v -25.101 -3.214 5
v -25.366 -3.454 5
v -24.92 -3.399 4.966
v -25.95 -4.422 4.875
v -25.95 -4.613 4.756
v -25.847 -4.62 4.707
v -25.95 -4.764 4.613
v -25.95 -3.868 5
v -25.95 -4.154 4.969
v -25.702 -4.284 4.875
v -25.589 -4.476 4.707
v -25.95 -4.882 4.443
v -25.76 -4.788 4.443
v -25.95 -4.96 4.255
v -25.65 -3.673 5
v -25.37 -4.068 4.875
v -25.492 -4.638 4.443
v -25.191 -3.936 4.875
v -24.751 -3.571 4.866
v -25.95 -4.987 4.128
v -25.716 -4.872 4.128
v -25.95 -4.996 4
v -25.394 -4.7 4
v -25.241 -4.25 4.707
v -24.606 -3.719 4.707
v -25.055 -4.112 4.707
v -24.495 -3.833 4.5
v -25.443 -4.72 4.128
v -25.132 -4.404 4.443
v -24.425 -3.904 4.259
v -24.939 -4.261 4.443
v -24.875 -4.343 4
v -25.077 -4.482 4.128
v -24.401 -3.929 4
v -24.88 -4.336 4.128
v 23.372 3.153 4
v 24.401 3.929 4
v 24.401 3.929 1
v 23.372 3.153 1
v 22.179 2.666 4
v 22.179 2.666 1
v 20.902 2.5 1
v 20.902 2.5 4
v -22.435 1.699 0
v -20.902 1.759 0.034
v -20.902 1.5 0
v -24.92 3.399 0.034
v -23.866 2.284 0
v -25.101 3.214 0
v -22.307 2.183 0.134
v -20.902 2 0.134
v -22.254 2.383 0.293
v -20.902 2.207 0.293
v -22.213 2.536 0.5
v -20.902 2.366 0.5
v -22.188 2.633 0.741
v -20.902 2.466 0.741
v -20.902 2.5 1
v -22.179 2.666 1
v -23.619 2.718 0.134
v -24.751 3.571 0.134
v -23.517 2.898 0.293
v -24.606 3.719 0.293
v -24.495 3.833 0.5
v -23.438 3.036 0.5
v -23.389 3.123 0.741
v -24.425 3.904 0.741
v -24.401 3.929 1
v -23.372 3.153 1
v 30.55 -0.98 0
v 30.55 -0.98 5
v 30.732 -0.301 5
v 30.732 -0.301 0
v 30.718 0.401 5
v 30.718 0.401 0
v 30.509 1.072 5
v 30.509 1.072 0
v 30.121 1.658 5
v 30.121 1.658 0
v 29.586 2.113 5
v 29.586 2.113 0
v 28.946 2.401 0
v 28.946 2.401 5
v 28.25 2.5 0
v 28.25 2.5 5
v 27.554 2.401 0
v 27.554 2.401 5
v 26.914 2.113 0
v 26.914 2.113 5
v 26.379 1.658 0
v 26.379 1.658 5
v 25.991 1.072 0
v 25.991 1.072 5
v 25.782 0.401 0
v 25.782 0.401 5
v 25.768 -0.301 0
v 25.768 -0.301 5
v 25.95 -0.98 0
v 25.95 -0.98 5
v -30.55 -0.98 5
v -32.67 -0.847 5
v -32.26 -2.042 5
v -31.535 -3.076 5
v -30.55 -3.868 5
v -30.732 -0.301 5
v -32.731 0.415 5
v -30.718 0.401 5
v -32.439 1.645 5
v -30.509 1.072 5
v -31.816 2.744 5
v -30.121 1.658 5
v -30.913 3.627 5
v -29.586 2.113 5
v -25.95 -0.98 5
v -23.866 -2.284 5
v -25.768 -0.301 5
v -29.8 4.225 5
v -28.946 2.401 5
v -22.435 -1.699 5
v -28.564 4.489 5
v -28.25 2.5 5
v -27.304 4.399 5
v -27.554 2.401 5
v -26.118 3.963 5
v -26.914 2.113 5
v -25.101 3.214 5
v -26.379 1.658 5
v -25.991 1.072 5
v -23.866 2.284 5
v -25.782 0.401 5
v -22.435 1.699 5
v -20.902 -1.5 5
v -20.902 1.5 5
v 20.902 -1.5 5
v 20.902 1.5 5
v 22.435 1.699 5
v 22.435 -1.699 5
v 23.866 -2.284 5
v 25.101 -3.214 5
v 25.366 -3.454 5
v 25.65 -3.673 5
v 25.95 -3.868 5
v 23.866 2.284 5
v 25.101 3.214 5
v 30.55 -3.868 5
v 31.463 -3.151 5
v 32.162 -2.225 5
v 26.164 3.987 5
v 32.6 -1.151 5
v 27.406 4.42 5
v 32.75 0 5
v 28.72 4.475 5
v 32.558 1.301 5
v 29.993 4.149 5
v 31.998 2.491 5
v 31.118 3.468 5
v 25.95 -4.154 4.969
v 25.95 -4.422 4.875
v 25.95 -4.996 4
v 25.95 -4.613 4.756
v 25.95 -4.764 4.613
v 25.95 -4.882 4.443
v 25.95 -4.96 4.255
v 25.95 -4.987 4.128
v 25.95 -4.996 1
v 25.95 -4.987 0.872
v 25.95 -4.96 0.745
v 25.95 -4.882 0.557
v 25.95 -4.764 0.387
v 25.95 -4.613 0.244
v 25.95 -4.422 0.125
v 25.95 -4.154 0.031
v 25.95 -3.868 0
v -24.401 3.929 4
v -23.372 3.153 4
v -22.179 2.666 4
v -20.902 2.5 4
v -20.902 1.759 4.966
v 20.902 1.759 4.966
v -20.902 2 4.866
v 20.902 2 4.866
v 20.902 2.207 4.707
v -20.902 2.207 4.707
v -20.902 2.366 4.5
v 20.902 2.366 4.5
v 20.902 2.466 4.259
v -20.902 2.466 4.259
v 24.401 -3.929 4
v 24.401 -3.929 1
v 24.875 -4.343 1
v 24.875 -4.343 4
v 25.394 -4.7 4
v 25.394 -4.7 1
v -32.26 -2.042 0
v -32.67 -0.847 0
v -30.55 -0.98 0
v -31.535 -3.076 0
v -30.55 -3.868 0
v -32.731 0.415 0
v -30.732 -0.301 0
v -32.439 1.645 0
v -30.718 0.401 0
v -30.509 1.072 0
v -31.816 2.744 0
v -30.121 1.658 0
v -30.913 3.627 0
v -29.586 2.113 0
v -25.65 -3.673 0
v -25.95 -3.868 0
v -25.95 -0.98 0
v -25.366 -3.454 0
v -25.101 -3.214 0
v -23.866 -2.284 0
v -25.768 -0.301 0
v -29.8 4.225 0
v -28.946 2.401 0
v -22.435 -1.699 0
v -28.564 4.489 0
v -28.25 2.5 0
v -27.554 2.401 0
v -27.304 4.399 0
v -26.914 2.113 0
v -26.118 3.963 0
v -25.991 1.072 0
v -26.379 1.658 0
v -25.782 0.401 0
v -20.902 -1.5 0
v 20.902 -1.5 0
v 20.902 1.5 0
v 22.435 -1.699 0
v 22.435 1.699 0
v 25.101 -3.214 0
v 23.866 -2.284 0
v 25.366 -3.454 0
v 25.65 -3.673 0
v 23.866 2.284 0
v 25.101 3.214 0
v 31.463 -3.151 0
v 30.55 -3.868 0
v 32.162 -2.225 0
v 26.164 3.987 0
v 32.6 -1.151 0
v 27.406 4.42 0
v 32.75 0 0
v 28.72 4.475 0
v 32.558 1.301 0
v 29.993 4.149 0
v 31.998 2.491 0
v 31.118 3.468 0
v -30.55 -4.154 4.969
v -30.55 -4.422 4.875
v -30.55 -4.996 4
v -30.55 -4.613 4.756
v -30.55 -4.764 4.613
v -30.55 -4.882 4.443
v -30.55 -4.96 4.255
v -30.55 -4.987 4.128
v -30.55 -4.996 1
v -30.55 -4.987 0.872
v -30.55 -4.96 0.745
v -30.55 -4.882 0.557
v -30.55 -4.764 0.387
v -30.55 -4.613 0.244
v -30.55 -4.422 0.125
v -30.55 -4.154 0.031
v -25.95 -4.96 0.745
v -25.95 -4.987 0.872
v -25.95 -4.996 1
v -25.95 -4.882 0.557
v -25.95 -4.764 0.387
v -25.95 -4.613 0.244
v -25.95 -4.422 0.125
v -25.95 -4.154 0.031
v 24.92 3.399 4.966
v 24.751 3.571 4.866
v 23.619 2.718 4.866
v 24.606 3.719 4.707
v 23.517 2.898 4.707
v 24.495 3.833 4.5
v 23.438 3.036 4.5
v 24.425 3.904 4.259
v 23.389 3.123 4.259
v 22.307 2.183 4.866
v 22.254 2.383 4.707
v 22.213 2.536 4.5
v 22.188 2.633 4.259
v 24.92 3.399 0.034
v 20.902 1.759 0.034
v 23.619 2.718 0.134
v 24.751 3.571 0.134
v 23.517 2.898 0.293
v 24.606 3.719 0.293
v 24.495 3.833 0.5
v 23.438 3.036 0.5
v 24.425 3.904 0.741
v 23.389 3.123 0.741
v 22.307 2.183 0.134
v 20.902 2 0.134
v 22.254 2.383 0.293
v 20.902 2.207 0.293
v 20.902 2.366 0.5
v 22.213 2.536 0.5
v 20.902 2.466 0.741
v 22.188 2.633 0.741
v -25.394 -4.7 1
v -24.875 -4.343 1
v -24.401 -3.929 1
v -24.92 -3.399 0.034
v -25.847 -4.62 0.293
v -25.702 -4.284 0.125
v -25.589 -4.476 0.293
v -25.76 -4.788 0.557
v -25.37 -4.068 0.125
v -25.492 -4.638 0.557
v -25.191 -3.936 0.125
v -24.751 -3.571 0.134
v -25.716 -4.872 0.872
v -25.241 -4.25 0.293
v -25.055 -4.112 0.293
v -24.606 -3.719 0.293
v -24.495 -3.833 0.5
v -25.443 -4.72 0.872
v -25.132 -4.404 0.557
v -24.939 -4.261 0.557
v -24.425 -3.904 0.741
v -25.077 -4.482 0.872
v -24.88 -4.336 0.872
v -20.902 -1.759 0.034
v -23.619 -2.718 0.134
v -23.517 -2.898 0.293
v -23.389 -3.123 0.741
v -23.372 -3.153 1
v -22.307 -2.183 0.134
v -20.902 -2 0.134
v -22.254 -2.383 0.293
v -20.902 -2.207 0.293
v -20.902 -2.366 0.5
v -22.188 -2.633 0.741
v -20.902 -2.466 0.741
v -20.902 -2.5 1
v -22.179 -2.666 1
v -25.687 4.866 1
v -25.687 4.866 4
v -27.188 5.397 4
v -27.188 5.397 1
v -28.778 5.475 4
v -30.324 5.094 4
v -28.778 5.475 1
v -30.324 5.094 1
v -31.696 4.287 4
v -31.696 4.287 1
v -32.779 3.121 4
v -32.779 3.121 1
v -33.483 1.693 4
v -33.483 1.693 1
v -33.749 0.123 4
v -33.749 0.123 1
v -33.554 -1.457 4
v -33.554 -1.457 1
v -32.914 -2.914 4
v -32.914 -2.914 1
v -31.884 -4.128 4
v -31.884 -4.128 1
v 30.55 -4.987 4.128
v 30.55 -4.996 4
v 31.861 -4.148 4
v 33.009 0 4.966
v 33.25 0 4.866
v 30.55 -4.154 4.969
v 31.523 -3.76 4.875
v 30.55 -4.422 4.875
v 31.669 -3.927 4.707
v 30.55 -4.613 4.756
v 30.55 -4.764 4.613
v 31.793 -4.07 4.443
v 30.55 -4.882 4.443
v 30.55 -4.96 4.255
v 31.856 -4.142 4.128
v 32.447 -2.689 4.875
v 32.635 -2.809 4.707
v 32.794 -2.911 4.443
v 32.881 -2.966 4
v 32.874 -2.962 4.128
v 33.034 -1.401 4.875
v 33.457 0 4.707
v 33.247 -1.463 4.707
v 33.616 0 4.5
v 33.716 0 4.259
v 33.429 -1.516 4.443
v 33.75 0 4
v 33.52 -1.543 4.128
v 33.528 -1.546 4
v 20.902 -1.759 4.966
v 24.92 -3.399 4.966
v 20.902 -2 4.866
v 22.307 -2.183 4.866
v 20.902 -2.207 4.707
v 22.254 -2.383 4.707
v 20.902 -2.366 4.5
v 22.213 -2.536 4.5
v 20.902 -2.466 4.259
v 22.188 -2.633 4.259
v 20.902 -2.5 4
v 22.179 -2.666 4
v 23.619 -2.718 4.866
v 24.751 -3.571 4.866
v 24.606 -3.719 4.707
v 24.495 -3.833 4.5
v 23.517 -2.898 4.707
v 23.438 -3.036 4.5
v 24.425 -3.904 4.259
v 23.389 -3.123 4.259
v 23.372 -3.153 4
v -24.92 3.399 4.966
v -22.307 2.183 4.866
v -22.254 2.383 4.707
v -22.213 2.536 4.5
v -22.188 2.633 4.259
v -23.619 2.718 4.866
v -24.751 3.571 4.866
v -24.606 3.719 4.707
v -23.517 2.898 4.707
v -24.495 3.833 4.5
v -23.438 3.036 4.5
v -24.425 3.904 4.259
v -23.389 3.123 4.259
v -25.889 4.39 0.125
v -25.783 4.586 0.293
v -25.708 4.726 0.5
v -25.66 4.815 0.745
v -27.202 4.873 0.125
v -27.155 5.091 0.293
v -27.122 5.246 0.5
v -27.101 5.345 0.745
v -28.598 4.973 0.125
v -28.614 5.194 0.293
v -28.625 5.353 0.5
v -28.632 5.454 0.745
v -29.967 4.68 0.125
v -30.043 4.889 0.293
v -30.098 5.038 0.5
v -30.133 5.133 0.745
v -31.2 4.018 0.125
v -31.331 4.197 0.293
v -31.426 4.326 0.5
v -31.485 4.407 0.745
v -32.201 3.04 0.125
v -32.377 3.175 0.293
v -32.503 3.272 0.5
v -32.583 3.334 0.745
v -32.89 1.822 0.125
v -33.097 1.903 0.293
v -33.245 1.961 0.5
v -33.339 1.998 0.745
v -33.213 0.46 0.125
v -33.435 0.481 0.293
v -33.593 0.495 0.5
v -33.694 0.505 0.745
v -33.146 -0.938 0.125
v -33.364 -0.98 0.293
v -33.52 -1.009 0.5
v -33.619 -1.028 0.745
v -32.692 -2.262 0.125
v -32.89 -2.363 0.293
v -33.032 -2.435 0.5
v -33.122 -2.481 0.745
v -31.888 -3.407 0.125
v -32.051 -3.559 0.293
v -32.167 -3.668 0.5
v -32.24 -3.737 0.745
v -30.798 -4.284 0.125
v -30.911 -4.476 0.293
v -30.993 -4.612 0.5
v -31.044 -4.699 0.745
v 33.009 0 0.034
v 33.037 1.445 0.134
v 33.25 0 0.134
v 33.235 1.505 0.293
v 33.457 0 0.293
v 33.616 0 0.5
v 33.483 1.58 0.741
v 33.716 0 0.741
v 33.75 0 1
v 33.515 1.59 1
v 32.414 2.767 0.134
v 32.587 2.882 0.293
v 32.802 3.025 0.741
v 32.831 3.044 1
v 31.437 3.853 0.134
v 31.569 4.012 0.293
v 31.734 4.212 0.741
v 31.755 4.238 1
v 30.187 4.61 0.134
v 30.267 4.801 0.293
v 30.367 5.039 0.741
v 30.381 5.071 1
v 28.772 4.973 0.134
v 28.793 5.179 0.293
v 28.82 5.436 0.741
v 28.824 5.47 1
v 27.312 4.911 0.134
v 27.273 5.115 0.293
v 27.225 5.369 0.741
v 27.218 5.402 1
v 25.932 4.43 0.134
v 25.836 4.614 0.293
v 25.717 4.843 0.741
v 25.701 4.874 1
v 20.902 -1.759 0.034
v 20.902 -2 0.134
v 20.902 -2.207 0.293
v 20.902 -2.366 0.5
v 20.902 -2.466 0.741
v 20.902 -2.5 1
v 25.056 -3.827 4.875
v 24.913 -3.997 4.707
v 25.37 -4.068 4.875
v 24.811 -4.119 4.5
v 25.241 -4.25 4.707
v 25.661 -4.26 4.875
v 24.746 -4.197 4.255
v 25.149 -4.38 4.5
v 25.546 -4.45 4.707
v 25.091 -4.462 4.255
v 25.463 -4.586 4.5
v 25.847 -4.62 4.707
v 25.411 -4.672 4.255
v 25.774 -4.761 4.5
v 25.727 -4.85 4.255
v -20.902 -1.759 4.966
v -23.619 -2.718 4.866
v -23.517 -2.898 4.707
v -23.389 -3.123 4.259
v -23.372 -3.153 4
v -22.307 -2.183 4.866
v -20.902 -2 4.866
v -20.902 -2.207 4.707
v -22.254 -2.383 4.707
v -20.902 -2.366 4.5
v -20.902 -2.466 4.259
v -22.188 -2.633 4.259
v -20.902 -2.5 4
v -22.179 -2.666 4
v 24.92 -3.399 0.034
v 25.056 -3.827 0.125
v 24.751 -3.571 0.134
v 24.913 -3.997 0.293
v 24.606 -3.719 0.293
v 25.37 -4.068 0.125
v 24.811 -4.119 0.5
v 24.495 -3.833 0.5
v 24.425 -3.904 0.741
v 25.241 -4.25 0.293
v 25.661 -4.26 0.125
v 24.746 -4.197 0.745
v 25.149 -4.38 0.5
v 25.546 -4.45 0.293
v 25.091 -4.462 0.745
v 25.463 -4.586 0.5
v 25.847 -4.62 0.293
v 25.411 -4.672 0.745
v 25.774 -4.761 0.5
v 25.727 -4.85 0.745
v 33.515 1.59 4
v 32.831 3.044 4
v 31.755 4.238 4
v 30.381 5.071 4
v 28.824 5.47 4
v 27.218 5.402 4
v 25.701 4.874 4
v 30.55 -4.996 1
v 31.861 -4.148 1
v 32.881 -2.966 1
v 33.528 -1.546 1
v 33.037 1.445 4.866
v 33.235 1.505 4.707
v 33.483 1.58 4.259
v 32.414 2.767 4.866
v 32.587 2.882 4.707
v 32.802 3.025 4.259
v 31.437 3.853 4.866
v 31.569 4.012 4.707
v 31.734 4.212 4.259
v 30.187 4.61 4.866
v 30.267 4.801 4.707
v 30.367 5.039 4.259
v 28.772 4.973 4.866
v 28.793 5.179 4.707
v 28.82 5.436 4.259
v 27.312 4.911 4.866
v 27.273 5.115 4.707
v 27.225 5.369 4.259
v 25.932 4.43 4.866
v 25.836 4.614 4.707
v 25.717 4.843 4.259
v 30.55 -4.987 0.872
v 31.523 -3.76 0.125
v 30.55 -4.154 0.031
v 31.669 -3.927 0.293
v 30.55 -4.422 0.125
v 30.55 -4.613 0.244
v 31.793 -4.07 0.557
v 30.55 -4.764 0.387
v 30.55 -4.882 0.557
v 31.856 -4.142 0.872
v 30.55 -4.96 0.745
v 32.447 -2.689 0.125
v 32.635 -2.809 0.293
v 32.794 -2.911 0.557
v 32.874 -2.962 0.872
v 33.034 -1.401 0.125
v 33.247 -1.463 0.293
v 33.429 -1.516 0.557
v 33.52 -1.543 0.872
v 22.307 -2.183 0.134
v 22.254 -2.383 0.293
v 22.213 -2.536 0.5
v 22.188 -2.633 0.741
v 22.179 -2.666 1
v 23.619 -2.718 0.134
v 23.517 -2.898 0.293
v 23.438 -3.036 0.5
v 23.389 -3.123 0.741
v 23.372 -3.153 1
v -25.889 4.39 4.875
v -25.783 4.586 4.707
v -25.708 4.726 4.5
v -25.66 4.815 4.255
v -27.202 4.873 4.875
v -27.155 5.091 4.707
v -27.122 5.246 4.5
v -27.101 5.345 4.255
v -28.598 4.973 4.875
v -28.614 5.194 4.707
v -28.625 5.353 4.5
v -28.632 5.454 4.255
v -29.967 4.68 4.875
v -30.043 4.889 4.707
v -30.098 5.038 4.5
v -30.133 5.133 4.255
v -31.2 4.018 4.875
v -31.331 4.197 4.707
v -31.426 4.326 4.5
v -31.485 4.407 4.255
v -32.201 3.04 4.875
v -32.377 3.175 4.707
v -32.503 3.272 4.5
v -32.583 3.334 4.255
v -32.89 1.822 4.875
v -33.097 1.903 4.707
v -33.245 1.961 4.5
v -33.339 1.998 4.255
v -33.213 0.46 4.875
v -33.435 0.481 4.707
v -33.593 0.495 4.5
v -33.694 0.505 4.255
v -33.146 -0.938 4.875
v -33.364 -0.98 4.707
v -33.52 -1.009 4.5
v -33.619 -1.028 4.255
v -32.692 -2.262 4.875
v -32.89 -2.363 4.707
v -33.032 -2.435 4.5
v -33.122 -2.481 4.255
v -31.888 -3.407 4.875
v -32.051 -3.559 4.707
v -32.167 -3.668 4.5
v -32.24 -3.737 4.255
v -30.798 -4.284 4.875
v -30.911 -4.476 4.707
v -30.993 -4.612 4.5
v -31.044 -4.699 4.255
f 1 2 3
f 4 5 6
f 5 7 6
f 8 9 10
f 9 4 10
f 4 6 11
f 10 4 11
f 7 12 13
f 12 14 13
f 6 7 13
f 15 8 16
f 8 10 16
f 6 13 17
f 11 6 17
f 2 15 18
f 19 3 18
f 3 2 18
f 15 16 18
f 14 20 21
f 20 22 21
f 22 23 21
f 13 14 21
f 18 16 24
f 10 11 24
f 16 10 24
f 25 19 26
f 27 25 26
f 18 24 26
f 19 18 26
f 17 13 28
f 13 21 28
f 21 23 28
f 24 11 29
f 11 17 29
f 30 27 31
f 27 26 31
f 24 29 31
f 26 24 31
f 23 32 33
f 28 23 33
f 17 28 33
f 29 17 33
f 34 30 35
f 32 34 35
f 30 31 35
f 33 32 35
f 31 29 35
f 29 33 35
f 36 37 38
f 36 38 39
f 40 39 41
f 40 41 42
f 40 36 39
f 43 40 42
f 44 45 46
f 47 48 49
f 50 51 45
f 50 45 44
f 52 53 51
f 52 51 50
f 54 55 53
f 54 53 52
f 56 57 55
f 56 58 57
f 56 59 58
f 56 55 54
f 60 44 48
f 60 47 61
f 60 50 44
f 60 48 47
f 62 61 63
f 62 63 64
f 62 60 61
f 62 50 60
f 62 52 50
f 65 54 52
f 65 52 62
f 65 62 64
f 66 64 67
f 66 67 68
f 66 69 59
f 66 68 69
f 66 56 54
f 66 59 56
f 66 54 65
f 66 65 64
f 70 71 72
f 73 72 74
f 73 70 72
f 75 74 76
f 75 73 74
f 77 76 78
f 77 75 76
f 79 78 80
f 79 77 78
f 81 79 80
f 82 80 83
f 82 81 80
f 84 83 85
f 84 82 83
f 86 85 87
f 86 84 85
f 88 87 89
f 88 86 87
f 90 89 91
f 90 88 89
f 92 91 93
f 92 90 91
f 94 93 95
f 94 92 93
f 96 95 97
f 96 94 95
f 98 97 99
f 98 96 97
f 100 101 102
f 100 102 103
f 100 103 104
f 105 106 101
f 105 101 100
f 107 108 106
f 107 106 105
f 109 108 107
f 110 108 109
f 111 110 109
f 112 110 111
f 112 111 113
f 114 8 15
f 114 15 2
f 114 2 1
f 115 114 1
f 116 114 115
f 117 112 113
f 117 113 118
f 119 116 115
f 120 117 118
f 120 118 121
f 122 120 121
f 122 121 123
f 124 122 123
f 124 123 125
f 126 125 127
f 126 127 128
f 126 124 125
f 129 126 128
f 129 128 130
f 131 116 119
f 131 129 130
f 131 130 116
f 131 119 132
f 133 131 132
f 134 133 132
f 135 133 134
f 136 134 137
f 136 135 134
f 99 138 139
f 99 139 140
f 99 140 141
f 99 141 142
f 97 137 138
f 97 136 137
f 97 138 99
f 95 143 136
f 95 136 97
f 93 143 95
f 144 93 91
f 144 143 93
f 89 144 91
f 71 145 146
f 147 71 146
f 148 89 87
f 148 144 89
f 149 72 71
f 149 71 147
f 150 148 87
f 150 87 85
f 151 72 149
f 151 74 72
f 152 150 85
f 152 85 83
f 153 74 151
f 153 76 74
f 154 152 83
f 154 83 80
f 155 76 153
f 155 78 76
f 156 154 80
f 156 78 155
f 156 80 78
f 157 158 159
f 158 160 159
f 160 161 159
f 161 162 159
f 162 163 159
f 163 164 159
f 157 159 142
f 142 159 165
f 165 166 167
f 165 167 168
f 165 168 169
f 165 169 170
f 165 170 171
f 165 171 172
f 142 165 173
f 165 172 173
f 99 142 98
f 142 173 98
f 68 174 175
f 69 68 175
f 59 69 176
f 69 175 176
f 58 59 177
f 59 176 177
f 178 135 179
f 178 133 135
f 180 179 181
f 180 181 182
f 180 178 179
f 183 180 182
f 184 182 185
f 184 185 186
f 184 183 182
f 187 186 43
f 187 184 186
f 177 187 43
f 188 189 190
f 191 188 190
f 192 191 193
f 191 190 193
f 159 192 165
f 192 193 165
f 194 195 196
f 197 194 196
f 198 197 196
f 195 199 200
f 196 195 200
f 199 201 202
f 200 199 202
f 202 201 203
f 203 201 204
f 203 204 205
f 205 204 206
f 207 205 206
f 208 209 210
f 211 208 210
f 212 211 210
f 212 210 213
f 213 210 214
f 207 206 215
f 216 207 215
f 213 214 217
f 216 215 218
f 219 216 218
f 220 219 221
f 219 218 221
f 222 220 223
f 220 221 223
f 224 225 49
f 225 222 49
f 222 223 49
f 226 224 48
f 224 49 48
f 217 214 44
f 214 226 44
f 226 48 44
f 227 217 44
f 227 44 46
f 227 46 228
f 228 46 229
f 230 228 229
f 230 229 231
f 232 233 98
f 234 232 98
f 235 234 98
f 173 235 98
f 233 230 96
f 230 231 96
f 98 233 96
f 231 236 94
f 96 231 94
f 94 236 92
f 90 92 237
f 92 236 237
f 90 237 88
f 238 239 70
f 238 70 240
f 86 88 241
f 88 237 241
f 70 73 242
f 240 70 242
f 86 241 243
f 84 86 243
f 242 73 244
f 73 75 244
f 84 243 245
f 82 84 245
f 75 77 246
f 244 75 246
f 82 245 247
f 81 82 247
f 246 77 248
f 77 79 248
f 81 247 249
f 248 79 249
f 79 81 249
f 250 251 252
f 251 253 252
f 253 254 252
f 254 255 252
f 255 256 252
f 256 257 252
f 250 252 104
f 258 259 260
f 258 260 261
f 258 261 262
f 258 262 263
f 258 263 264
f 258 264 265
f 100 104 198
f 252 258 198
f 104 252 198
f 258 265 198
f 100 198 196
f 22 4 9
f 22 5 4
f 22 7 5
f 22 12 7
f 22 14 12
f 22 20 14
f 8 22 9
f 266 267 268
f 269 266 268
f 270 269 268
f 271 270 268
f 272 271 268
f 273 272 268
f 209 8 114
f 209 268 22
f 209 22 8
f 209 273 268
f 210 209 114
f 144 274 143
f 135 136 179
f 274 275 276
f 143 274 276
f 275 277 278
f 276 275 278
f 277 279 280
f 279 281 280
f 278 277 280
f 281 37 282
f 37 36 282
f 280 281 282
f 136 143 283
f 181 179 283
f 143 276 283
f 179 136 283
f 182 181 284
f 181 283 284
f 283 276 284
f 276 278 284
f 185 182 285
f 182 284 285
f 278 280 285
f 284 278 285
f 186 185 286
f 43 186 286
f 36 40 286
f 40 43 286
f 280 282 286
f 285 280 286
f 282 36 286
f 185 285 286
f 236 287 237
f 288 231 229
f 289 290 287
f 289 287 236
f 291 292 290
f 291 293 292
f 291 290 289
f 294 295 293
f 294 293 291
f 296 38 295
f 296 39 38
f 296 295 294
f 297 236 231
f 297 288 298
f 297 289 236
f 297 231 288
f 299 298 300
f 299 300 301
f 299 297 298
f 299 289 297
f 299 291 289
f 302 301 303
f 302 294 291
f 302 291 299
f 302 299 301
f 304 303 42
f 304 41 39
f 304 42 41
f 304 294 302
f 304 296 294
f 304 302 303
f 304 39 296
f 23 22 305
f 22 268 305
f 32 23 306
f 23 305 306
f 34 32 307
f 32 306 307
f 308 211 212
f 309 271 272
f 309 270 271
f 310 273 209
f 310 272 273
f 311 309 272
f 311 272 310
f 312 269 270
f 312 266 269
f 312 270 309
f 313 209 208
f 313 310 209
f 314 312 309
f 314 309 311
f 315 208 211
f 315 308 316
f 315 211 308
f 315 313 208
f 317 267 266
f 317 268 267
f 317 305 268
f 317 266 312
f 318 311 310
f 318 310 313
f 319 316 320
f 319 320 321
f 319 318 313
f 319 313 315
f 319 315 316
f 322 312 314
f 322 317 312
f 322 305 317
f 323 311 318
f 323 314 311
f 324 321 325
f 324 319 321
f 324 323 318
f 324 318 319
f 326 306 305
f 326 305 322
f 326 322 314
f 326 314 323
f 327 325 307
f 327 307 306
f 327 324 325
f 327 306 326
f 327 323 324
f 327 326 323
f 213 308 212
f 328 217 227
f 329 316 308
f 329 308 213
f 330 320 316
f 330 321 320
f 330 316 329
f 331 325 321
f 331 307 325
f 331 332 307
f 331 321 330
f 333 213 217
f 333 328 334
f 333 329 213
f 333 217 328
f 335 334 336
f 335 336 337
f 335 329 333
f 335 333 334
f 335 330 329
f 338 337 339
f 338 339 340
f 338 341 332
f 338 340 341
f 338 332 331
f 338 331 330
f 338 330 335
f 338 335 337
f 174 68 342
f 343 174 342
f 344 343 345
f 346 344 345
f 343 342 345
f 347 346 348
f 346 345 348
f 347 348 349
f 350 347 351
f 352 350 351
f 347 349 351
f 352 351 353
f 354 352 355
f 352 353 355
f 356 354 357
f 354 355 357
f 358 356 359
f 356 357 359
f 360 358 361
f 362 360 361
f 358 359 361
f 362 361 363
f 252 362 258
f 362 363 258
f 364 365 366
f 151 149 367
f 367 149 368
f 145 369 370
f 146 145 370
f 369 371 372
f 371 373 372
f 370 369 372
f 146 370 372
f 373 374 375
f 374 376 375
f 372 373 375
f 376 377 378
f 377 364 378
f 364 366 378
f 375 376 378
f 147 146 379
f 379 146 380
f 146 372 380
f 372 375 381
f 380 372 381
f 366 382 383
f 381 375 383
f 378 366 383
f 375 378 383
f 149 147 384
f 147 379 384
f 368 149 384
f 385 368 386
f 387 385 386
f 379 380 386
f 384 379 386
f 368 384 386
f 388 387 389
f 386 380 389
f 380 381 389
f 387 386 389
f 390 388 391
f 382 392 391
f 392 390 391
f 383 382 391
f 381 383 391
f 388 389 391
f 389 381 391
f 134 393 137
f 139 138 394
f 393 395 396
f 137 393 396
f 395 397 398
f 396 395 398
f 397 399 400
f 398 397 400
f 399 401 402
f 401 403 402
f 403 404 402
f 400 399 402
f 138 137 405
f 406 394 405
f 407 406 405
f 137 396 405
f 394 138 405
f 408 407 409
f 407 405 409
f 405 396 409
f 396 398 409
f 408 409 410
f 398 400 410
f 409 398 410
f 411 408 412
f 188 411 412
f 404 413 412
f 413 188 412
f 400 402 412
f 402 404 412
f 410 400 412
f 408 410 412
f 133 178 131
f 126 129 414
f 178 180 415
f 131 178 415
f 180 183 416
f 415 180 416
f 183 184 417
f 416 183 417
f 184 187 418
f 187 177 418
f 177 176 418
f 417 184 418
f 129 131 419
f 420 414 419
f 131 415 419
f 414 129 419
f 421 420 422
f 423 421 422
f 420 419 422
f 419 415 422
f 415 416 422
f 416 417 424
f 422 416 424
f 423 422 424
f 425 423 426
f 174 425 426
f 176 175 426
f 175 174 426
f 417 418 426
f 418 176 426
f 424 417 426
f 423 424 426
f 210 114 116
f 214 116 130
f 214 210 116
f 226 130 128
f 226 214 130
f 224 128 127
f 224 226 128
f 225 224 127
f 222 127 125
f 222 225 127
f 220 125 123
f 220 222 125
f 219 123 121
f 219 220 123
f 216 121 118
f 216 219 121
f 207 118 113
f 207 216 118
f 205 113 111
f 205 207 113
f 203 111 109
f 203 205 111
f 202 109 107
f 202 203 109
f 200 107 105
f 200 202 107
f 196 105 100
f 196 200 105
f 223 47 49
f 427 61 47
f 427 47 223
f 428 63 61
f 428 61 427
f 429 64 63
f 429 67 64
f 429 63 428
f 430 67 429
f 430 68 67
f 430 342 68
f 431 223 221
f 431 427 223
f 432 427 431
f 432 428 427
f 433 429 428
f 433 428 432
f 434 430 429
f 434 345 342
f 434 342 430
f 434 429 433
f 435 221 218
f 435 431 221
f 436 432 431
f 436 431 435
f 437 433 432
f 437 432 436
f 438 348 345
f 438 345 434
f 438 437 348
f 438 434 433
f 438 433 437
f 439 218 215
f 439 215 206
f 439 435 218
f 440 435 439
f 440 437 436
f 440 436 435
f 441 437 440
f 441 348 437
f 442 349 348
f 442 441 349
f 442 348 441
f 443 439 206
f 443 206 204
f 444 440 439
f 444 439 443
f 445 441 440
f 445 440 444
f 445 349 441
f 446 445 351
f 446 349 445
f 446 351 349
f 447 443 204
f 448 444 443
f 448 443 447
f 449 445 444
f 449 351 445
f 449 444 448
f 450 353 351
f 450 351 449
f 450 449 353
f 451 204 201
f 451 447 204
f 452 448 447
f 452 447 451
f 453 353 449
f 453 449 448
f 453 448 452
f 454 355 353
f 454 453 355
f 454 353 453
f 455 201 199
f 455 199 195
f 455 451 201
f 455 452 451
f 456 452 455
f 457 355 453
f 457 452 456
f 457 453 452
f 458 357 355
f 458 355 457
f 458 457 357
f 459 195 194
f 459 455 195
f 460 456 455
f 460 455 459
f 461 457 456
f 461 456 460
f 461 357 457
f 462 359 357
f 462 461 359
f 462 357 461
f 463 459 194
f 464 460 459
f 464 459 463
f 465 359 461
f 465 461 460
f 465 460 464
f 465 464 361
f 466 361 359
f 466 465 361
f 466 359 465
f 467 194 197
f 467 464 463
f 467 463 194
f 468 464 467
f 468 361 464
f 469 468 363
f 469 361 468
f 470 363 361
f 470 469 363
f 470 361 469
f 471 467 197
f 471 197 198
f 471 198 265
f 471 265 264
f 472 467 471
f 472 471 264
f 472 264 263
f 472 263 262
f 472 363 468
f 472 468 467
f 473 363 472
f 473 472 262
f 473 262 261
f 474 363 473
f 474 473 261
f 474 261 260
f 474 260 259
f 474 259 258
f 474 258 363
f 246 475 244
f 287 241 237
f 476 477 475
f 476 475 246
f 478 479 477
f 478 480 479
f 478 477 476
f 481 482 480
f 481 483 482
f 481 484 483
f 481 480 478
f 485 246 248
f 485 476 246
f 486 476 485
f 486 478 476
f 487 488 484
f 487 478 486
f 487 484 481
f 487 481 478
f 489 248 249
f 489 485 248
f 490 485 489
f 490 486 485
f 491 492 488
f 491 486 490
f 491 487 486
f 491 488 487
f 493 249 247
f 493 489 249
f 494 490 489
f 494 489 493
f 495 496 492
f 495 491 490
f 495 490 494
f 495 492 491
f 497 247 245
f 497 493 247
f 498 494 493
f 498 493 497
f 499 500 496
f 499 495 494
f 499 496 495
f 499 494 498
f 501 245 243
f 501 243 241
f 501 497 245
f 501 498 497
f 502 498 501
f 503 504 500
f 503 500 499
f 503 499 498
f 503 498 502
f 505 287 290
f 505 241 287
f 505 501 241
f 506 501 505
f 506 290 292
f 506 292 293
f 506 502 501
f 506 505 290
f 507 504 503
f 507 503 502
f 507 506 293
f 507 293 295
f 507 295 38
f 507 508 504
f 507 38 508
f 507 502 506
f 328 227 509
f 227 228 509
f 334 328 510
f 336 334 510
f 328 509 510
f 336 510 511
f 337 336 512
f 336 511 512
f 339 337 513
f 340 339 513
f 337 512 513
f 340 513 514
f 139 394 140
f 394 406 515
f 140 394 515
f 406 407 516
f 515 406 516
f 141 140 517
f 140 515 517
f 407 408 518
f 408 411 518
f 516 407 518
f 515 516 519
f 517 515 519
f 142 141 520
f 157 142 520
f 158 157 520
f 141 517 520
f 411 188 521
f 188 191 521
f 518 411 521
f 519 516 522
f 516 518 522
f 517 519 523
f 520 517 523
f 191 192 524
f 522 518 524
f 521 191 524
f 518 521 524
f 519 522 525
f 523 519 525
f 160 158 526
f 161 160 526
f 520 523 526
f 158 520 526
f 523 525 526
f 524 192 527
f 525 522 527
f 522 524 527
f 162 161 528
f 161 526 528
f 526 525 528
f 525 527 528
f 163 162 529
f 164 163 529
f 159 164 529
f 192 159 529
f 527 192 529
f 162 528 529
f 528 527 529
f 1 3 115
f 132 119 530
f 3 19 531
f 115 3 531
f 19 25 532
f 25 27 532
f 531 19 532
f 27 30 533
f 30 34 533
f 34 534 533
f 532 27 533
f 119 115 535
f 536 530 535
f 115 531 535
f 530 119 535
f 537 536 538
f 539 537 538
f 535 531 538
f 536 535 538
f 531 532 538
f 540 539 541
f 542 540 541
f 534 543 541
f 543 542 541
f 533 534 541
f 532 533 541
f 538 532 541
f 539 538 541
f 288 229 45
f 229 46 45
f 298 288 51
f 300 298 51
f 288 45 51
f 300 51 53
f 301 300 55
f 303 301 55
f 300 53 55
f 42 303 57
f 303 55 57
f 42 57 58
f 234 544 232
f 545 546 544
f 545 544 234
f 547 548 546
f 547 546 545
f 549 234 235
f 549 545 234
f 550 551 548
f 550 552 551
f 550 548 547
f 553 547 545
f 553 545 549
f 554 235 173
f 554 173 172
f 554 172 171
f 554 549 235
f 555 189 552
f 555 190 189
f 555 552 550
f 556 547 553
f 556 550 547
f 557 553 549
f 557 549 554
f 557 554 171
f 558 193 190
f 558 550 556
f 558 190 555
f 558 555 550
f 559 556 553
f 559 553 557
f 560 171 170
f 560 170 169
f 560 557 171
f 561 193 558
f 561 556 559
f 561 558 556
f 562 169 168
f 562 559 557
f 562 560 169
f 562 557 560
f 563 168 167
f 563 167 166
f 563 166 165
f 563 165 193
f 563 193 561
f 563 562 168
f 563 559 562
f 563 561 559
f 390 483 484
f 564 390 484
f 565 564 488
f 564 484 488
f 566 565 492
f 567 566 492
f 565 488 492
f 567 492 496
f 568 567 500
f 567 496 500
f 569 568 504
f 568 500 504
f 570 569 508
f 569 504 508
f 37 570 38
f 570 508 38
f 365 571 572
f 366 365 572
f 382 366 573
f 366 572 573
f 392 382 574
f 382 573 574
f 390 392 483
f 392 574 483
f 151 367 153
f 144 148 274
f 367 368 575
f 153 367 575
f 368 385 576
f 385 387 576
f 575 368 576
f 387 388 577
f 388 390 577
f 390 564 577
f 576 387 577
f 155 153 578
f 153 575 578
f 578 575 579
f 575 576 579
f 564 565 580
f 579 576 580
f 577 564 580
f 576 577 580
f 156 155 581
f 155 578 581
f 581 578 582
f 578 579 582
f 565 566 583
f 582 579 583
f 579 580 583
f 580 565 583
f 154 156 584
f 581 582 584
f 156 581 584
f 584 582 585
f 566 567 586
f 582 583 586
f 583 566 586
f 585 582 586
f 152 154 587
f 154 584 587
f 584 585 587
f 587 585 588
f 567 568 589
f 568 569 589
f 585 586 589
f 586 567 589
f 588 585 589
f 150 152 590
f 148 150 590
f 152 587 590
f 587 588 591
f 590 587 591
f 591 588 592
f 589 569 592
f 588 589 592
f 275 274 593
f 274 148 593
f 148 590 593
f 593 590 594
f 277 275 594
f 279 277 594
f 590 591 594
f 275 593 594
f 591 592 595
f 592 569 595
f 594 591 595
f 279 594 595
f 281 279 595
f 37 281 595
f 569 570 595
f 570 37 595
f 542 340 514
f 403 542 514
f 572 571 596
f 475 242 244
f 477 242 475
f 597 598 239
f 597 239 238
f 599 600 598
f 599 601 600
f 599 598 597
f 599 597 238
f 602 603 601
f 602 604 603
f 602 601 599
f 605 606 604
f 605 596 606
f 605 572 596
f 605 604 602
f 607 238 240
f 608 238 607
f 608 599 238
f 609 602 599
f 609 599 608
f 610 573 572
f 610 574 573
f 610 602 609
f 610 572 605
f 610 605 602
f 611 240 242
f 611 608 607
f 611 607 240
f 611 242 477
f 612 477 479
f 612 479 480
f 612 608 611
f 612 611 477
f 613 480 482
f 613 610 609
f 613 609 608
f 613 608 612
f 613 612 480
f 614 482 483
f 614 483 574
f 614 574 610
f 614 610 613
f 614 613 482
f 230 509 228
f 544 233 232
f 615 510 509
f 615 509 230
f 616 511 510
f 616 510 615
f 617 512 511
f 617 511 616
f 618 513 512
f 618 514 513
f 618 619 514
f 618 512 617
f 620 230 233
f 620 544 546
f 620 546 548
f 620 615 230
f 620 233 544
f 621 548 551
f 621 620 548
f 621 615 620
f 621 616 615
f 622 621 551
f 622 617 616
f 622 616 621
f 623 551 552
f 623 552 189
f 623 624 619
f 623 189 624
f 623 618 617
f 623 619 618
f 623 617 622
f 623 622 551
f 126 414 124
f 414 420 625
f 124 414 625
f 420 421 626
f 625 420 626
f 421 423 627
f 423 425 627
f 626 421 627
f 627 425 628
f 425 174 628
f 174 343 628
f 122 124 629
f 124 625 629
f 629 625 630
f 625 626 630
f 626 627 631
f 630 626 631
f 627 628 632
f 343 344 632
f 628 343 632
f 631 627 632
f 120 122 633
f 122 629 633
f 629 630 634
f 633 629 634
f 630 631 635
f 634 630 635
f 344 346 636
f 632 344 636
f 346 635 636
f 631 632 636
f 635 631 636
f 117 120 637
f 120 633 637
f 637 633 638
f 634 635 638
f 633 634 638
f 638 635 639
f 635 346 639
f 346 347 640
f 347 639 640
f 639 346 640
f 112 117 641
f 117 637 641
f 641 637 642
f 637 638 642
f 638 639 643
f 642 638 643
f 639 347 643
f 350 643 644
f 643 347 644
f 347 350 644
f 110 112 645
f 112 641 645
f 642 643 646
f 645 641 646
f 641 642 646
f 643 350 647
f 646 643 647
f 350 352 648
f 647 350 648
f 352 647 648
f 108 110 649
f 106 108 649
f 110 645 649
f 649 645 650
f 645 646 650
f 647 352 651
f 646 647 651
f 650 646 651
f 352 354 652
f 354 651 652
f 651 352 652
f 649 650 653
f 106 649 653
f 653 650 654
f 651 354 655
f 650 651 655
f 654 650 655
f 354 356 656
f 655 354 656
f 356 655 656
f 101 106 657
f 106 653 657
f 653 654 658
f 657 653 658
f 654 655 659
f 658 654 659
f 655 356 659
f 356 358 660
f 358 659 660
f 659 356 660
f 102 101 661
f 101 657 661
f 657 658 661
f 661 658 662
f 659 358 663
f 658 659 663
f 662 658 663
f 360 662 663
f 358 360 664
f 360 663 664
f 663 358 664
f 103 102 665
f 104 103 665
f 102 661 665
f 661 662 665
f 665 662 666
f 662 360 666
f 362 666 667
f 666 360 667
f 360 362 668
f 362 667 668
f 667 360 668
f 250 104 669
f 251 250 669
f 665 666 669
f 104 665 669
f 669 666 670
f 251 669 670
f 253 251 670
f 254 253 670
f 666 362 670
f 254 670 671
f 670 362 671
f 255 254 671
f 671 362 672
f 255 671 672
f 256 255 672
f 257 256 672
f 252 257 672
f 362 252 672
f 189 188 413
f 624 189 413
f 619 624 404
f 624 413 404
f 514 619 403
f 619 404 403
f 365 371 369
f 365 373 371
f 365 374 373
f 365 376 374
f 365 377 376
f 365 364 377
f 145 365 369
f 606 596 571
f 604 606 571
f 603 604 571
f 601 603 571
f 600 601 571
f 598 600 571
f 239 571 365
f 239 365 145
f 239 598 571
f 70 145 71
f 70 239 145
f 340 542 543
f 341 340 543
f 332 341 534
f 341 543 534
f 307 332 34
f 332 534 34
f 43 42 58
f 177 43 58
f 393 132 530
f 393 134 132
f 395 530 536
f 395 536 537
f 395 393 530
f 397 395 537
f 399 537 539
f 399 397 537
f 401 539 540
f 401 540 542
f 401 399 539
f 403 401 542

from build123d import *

# Parameters (mm, degrees)
F0_R     = 2.5
F1_DEPTH = 5
F2_R     = 5
F3_R     = 1
F4_W     = 4.6
F4_H     = 8.970495
F5_DEPTH = 5.001


with BuildPart() as f1:
    # F0 (on Top) → F1 (new body)
    with BuildSketch(Plane.XY):
        with BuildLine():
            ThreePointArc((23.351021, -2.5), (29.535615, -5.347634), (33.75, 0))
            ThreePointArc((33.75, 0), (29.535615, 5.347634), (23.351021, 2.5))
            ThreePointArc((23.351021, 2.5), (22.75, 0), (23.351021, -2.5))
        make_face()
        with Locations((28.25, 0)):
            Circle(F0_R, mode=Mode.SUBTRACT)
        with BuildLine():
            ThreePointArc((23.351021, -2.5), (22.75, 0), (23.351021, 2.5))
            Line((23.351021, 2.5), (-23.351021, 2.5))
            ThreePointArc((-23.351021, 2.5), (-22.902366, 1.285615), (-22.75, 0))
            ThreePointArc((-22.75, 0), (-22.902366, -1.285615), (-23.351021, -2.5))
            Line((-23.351021, -2.5), (23.351021, -2.5))
        make_face()
        with BuildLine():
            ThreePointArc((-22.75, 0), (-22.902366, 1.285615), (-23.351021, 2.5))
            ThreePointArc((-23.351021, 2.5), (-33.75, 0), (-23.351021, -2.5))
            ThreePointArc((-23.351021, -2.5), (-22.902366, -1.285615), (-22.75, 0))
        make_face()
        with Locations((-28.25, 0)):
            Circle(F0_R, mode=Mode.SUBTRACT)
    extrude(amount=F1_DEPTH)

    # F2
    f2_edges = [f1.edges().sort_by_distance(p)[0] for p in [
        (-23.351021, -2.5, 2.5),
        (-23.351021, 2.5, 2.5),
        (23.351021, 2.5, 2.5),
        (23.351021, -2.5, 2.5),
    ]]
    fillet(f2_edges, radius=F2_R)

    # F3
    f3_edges = [f1.edges().sort_by_distance(p)[0] for p in [
        (0, -2.5, 5),
        (0, -2.5, 0),
    ]]
    fillet(f3_edges, radius=F3_R)

    # F4 (on Top) → F5 (cut, through all)
    with BuildSketch(Plane.XY):
        with Locations((-28.25, -4.485247)):
            Rectangle(F4_W, F4_H)
        with Locations((28.25, -4.485247)):
            Rectangle(F4_W, F4_H)
    extrude(amount=F5_DEPTH, mode=Mode.SUBTRACT)


solid = f1.part
